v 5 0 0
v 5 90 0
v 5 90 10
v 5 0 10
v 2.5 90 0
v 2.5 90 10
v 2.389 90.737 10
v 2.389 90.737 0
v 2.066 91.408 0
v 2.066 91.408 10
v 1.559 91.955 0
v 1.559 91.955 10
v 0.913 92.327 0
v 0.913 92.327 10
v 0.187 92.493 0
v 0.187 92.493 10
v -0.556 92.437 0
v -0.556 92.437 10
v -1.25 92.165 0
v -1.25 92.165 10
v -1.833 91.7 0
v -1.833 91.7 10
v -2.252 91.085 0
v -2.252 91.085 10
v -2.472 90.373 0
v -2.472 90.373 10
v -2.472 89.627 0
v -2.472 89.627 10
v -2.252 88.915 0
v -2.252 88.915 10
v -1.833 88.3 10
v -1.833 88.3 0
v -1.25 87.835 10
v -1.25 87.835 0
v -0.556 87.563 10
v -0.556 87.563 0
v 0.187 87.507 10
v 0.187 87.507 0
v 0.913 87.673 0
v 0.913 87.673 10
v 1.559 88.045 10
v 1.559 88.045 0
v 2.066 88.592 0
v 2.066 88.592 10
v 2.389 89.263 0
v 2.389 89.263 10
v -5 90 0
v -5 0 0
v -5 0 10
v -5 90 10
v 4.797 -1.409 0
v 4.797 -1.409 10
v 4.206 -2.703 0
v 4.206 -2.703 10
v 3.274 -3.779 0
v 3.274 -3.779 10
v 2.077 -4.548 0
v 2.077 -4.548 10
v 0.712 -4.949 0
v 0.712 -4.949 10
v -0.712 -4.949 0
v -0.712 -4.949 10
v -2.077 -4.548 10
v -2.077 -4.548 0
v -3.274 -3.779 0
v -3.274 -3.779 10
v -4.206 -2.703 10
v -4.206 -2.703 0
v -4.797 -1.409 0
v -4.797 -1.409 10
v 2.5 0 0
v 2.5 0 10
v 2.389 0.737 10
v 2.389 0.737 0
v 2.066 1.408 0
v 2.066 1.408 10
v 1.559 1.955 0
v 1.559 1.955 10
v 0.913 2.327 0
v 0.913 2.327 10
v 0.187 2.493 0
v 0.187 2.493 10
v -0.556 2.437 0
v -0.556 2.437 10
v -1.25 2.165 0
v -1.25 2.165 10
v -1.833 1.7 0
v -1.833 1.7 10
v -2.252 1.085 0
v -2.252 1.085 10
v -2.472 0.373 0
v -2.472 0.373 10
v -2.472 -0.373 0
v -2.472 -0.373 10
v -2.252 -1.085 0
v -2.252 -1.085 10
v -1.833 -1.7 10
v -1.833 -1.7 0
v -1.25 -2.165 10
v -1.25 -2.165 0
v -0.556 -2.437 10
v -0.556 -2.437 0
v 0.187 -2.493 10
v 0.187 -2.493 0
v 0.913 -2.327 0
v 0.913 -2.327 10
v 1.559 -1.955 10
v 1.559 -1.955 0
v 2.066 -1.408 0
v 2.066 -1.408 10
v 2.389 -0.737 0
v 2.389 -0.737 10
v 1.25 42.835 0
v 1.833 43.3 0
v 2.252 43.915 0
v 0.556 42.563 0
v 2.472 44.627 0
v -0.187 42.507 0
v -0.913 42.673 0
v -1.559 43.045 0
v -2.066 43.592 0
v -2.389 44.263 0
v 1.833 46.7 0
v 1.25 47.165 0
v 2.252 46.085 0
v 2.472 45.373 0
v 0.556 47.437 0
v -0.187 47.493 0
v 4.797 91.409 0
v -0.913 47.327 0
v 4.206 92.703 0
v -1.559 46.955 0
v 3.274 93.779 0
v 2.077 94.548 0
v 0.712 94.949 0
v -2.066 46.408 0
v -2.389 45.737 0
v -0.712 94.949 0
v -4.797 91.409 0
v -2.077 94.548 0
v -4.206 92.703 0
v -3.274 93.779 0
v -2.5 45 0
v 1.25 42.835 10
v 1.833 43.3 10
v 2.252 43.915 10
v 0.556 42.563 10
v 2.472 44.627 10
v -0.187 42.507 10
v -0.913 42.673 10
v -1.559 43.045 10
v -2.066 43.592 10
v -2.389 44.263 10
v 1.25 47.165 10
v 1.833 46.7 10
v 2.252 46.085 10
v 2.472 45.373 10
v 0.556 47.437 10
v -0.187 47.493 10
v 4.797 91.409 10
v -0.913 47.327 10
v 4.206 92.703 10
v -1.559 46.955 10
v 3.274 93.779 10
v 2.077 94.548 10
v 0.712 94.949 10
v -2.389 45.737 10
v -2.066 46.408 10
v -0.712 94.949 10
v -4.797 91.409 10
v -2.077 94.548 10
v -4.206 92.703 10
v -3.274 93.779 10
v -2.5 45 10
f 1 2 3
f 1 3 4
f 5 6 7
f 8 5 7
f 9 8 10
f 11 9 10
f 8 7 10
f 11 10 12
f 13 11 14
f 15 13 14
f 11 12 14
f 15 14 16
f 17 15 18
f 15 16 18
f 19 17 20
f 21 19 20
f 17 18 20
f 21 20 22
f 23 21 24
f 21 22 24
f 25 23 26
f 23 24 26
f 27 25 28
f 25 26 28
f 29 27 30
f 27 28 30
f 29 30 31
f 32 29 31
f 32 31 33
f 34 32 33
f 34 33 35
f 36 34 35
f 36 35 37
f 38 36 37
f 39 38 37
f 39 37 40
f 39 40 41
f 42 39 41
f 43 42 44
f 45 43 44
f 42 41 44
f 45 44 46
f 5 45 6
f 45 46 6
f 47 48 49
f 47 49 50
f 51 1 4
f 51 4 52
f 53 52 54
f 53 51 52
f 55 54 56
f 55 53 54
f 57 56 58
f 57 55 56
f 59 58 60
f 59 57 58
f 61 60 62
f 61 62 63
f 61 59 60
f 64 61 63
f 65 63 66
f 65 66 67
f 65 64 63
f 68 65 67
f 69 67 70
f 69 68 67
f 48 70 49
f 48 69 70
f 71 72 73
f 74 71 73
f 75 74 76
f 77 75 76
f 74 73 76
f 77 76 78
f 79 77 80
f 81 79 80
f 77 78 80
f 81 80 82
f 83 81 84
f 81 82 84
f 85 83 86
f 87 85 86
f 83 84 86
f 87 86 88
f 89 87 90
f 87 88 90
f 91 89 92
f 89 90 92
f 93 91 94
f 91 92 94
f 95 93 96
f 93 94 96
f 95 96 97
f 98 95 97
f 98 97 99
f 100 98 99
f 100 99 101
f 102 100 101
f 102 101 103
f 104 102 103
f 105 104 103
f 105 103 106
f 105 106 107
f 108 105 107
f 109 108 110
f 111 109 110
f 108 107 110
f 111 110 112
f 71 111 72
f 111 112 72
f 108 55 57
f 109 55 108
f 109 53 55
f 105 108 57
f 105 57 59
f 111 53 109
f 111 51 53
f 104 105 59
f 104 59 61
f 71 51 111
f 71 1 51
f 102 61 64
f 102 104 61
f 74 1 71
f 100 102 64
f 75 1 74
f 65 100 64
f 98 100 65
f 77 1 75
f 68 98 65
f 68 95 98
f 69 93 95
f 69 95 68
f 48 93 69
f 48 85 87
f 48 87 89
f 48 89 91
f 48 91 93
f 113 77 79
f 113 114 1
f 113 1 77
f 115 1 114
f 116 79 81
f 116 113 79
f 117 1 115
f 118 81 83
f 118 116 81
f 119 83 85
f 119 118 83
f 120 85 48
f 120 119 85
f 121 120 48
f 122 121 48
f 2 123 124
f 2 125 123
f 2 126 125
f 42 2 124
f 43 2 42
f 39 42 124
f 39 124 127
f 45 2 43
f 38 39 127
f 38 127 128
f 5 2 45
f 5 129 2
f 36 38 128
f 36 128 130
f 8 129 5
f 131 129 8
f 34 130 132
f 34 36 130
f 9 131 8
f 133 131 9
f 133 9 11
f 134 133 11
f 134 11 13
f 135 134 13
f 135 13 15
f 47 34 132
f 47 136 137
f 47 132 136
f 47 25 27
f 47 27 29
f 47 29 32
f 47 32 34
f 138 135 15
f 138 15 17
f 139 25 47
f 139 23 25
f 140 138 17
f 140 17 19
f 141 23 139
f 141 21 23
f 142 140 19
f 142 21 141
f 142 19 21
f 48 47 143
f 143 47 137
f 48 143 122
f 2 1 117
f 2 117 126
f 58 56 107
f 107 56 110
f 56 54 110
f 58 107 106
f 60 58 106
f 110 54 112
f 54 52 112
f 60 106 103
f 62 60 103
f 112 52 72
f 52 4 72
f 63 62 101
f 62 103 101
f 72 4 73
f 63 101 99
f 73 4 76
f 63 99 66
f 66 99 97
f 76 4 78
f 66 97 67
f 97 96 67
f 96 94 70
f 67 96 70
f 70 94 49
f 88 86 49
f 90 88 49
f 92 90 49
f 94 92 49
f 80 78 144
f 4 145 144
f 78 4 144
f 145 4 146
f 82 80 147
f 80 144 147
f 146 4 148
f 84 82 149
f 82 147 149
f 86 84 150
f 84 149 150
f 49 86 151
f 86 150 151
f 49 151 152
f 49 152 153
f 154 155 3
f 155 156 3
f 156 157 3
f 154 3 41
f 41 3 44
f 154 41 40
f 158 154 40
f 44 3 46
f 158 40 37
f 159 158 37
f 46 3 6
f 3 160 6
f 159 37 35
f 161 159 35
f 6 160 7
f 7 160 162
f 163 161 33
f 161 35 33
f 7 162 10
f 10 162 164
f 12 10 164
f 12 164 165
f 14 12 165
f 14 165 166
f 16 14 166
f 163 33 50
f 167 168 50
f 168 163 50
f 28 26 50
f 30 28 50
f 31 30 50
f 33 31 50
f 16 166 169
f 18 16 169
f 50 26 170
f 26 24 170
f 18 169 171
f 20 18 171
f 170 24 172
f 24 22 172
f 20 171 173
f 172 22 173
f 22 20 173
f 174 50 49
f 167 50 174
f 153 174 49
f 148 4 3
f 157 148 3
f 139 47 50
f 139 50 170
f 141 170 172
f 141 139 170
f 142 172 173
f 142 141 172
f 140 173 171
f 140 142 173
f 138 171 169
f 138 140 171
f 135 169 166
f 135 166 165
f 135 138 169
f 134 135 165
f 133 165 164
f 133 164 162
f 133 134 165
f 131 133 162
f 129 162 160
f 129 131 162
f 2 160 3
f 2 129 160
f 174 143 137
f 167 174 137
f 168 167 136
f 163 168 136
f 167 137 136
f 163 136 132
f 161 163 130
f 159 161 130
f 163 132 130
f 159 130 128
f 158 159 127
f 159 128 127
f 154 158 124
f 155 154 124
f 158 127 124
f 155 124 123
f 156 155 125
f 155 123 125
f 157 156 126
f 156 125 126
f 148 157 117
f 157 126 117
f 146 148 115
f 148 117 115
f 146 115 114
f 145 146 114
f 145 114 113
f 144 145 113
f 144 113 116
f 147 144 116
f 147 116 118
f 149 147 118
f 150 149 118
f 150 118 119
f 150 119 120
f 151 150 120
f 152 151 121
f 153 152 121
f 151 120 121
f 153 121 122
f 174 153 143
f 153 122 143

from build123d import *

# Parameters (mm, degrees)
EXTRUDE_1_DEPTH     = 10
SKETCH_3_R          = 2.5
CUT_EXTRUDE_1_DEPTH = 10
SKETCH_4_R          = 2.5
CUT_EXTRUDE_2_DEPTH = 10
SKETCH_5_R          = 2.5
CUT_EXTRUDE_3_DEPTH = 10


with BuildPart() as part:
    # 草图1 → 凸台-拉伸1 (new body)
    with BuildSketch(Plane.XY):
        with BuildLine():
            Line((-5, 0), (-5, 90))
            ThreePointArc((-5, 90), (0, 95), (5, 90))
            Line((5, 90), (5, 0))
            ThreePointArc((5, 0), (0, -5), (-5, 0))
        make_face()
    extrude(amount=EXTRUDE_1_DEPTH)

    # 草图3 → 切除-拉伸1 (cut)
    with BuildSketch(Plane(origin=(0, 0, 0), x_dir=(-1, 0, 0), z_dir=(0, 0, -1))):
        with Locations((0, 45)):
            Circle(SKETCH_3_R)
    extrude(amount=-CUT_EXTRUDE_1_DEPTH, mode=Mode.SUBTRACT)

    # 草图4 → 切除-拉伸2 (cut)
    with BuildSketch(Plane.XY.offset(10)):
        with Locations((0, 90)):
            Circle(SKETCH_4_R)
    extrude(amount=-CUT_EXTRUDE_2_DEPTH, mode=Mode.SUBTRACT)

    # 草图5 → 切除-拉伸3 (cut)
    with BuildSketch(Plane.XY.offset(10)):
        Circle(SKETCH_5_R)
    extrude(amount=-CUT_EXTRUDE_3_DEPTH, mode=Mode.SUBTRACT)


solid = part.part
